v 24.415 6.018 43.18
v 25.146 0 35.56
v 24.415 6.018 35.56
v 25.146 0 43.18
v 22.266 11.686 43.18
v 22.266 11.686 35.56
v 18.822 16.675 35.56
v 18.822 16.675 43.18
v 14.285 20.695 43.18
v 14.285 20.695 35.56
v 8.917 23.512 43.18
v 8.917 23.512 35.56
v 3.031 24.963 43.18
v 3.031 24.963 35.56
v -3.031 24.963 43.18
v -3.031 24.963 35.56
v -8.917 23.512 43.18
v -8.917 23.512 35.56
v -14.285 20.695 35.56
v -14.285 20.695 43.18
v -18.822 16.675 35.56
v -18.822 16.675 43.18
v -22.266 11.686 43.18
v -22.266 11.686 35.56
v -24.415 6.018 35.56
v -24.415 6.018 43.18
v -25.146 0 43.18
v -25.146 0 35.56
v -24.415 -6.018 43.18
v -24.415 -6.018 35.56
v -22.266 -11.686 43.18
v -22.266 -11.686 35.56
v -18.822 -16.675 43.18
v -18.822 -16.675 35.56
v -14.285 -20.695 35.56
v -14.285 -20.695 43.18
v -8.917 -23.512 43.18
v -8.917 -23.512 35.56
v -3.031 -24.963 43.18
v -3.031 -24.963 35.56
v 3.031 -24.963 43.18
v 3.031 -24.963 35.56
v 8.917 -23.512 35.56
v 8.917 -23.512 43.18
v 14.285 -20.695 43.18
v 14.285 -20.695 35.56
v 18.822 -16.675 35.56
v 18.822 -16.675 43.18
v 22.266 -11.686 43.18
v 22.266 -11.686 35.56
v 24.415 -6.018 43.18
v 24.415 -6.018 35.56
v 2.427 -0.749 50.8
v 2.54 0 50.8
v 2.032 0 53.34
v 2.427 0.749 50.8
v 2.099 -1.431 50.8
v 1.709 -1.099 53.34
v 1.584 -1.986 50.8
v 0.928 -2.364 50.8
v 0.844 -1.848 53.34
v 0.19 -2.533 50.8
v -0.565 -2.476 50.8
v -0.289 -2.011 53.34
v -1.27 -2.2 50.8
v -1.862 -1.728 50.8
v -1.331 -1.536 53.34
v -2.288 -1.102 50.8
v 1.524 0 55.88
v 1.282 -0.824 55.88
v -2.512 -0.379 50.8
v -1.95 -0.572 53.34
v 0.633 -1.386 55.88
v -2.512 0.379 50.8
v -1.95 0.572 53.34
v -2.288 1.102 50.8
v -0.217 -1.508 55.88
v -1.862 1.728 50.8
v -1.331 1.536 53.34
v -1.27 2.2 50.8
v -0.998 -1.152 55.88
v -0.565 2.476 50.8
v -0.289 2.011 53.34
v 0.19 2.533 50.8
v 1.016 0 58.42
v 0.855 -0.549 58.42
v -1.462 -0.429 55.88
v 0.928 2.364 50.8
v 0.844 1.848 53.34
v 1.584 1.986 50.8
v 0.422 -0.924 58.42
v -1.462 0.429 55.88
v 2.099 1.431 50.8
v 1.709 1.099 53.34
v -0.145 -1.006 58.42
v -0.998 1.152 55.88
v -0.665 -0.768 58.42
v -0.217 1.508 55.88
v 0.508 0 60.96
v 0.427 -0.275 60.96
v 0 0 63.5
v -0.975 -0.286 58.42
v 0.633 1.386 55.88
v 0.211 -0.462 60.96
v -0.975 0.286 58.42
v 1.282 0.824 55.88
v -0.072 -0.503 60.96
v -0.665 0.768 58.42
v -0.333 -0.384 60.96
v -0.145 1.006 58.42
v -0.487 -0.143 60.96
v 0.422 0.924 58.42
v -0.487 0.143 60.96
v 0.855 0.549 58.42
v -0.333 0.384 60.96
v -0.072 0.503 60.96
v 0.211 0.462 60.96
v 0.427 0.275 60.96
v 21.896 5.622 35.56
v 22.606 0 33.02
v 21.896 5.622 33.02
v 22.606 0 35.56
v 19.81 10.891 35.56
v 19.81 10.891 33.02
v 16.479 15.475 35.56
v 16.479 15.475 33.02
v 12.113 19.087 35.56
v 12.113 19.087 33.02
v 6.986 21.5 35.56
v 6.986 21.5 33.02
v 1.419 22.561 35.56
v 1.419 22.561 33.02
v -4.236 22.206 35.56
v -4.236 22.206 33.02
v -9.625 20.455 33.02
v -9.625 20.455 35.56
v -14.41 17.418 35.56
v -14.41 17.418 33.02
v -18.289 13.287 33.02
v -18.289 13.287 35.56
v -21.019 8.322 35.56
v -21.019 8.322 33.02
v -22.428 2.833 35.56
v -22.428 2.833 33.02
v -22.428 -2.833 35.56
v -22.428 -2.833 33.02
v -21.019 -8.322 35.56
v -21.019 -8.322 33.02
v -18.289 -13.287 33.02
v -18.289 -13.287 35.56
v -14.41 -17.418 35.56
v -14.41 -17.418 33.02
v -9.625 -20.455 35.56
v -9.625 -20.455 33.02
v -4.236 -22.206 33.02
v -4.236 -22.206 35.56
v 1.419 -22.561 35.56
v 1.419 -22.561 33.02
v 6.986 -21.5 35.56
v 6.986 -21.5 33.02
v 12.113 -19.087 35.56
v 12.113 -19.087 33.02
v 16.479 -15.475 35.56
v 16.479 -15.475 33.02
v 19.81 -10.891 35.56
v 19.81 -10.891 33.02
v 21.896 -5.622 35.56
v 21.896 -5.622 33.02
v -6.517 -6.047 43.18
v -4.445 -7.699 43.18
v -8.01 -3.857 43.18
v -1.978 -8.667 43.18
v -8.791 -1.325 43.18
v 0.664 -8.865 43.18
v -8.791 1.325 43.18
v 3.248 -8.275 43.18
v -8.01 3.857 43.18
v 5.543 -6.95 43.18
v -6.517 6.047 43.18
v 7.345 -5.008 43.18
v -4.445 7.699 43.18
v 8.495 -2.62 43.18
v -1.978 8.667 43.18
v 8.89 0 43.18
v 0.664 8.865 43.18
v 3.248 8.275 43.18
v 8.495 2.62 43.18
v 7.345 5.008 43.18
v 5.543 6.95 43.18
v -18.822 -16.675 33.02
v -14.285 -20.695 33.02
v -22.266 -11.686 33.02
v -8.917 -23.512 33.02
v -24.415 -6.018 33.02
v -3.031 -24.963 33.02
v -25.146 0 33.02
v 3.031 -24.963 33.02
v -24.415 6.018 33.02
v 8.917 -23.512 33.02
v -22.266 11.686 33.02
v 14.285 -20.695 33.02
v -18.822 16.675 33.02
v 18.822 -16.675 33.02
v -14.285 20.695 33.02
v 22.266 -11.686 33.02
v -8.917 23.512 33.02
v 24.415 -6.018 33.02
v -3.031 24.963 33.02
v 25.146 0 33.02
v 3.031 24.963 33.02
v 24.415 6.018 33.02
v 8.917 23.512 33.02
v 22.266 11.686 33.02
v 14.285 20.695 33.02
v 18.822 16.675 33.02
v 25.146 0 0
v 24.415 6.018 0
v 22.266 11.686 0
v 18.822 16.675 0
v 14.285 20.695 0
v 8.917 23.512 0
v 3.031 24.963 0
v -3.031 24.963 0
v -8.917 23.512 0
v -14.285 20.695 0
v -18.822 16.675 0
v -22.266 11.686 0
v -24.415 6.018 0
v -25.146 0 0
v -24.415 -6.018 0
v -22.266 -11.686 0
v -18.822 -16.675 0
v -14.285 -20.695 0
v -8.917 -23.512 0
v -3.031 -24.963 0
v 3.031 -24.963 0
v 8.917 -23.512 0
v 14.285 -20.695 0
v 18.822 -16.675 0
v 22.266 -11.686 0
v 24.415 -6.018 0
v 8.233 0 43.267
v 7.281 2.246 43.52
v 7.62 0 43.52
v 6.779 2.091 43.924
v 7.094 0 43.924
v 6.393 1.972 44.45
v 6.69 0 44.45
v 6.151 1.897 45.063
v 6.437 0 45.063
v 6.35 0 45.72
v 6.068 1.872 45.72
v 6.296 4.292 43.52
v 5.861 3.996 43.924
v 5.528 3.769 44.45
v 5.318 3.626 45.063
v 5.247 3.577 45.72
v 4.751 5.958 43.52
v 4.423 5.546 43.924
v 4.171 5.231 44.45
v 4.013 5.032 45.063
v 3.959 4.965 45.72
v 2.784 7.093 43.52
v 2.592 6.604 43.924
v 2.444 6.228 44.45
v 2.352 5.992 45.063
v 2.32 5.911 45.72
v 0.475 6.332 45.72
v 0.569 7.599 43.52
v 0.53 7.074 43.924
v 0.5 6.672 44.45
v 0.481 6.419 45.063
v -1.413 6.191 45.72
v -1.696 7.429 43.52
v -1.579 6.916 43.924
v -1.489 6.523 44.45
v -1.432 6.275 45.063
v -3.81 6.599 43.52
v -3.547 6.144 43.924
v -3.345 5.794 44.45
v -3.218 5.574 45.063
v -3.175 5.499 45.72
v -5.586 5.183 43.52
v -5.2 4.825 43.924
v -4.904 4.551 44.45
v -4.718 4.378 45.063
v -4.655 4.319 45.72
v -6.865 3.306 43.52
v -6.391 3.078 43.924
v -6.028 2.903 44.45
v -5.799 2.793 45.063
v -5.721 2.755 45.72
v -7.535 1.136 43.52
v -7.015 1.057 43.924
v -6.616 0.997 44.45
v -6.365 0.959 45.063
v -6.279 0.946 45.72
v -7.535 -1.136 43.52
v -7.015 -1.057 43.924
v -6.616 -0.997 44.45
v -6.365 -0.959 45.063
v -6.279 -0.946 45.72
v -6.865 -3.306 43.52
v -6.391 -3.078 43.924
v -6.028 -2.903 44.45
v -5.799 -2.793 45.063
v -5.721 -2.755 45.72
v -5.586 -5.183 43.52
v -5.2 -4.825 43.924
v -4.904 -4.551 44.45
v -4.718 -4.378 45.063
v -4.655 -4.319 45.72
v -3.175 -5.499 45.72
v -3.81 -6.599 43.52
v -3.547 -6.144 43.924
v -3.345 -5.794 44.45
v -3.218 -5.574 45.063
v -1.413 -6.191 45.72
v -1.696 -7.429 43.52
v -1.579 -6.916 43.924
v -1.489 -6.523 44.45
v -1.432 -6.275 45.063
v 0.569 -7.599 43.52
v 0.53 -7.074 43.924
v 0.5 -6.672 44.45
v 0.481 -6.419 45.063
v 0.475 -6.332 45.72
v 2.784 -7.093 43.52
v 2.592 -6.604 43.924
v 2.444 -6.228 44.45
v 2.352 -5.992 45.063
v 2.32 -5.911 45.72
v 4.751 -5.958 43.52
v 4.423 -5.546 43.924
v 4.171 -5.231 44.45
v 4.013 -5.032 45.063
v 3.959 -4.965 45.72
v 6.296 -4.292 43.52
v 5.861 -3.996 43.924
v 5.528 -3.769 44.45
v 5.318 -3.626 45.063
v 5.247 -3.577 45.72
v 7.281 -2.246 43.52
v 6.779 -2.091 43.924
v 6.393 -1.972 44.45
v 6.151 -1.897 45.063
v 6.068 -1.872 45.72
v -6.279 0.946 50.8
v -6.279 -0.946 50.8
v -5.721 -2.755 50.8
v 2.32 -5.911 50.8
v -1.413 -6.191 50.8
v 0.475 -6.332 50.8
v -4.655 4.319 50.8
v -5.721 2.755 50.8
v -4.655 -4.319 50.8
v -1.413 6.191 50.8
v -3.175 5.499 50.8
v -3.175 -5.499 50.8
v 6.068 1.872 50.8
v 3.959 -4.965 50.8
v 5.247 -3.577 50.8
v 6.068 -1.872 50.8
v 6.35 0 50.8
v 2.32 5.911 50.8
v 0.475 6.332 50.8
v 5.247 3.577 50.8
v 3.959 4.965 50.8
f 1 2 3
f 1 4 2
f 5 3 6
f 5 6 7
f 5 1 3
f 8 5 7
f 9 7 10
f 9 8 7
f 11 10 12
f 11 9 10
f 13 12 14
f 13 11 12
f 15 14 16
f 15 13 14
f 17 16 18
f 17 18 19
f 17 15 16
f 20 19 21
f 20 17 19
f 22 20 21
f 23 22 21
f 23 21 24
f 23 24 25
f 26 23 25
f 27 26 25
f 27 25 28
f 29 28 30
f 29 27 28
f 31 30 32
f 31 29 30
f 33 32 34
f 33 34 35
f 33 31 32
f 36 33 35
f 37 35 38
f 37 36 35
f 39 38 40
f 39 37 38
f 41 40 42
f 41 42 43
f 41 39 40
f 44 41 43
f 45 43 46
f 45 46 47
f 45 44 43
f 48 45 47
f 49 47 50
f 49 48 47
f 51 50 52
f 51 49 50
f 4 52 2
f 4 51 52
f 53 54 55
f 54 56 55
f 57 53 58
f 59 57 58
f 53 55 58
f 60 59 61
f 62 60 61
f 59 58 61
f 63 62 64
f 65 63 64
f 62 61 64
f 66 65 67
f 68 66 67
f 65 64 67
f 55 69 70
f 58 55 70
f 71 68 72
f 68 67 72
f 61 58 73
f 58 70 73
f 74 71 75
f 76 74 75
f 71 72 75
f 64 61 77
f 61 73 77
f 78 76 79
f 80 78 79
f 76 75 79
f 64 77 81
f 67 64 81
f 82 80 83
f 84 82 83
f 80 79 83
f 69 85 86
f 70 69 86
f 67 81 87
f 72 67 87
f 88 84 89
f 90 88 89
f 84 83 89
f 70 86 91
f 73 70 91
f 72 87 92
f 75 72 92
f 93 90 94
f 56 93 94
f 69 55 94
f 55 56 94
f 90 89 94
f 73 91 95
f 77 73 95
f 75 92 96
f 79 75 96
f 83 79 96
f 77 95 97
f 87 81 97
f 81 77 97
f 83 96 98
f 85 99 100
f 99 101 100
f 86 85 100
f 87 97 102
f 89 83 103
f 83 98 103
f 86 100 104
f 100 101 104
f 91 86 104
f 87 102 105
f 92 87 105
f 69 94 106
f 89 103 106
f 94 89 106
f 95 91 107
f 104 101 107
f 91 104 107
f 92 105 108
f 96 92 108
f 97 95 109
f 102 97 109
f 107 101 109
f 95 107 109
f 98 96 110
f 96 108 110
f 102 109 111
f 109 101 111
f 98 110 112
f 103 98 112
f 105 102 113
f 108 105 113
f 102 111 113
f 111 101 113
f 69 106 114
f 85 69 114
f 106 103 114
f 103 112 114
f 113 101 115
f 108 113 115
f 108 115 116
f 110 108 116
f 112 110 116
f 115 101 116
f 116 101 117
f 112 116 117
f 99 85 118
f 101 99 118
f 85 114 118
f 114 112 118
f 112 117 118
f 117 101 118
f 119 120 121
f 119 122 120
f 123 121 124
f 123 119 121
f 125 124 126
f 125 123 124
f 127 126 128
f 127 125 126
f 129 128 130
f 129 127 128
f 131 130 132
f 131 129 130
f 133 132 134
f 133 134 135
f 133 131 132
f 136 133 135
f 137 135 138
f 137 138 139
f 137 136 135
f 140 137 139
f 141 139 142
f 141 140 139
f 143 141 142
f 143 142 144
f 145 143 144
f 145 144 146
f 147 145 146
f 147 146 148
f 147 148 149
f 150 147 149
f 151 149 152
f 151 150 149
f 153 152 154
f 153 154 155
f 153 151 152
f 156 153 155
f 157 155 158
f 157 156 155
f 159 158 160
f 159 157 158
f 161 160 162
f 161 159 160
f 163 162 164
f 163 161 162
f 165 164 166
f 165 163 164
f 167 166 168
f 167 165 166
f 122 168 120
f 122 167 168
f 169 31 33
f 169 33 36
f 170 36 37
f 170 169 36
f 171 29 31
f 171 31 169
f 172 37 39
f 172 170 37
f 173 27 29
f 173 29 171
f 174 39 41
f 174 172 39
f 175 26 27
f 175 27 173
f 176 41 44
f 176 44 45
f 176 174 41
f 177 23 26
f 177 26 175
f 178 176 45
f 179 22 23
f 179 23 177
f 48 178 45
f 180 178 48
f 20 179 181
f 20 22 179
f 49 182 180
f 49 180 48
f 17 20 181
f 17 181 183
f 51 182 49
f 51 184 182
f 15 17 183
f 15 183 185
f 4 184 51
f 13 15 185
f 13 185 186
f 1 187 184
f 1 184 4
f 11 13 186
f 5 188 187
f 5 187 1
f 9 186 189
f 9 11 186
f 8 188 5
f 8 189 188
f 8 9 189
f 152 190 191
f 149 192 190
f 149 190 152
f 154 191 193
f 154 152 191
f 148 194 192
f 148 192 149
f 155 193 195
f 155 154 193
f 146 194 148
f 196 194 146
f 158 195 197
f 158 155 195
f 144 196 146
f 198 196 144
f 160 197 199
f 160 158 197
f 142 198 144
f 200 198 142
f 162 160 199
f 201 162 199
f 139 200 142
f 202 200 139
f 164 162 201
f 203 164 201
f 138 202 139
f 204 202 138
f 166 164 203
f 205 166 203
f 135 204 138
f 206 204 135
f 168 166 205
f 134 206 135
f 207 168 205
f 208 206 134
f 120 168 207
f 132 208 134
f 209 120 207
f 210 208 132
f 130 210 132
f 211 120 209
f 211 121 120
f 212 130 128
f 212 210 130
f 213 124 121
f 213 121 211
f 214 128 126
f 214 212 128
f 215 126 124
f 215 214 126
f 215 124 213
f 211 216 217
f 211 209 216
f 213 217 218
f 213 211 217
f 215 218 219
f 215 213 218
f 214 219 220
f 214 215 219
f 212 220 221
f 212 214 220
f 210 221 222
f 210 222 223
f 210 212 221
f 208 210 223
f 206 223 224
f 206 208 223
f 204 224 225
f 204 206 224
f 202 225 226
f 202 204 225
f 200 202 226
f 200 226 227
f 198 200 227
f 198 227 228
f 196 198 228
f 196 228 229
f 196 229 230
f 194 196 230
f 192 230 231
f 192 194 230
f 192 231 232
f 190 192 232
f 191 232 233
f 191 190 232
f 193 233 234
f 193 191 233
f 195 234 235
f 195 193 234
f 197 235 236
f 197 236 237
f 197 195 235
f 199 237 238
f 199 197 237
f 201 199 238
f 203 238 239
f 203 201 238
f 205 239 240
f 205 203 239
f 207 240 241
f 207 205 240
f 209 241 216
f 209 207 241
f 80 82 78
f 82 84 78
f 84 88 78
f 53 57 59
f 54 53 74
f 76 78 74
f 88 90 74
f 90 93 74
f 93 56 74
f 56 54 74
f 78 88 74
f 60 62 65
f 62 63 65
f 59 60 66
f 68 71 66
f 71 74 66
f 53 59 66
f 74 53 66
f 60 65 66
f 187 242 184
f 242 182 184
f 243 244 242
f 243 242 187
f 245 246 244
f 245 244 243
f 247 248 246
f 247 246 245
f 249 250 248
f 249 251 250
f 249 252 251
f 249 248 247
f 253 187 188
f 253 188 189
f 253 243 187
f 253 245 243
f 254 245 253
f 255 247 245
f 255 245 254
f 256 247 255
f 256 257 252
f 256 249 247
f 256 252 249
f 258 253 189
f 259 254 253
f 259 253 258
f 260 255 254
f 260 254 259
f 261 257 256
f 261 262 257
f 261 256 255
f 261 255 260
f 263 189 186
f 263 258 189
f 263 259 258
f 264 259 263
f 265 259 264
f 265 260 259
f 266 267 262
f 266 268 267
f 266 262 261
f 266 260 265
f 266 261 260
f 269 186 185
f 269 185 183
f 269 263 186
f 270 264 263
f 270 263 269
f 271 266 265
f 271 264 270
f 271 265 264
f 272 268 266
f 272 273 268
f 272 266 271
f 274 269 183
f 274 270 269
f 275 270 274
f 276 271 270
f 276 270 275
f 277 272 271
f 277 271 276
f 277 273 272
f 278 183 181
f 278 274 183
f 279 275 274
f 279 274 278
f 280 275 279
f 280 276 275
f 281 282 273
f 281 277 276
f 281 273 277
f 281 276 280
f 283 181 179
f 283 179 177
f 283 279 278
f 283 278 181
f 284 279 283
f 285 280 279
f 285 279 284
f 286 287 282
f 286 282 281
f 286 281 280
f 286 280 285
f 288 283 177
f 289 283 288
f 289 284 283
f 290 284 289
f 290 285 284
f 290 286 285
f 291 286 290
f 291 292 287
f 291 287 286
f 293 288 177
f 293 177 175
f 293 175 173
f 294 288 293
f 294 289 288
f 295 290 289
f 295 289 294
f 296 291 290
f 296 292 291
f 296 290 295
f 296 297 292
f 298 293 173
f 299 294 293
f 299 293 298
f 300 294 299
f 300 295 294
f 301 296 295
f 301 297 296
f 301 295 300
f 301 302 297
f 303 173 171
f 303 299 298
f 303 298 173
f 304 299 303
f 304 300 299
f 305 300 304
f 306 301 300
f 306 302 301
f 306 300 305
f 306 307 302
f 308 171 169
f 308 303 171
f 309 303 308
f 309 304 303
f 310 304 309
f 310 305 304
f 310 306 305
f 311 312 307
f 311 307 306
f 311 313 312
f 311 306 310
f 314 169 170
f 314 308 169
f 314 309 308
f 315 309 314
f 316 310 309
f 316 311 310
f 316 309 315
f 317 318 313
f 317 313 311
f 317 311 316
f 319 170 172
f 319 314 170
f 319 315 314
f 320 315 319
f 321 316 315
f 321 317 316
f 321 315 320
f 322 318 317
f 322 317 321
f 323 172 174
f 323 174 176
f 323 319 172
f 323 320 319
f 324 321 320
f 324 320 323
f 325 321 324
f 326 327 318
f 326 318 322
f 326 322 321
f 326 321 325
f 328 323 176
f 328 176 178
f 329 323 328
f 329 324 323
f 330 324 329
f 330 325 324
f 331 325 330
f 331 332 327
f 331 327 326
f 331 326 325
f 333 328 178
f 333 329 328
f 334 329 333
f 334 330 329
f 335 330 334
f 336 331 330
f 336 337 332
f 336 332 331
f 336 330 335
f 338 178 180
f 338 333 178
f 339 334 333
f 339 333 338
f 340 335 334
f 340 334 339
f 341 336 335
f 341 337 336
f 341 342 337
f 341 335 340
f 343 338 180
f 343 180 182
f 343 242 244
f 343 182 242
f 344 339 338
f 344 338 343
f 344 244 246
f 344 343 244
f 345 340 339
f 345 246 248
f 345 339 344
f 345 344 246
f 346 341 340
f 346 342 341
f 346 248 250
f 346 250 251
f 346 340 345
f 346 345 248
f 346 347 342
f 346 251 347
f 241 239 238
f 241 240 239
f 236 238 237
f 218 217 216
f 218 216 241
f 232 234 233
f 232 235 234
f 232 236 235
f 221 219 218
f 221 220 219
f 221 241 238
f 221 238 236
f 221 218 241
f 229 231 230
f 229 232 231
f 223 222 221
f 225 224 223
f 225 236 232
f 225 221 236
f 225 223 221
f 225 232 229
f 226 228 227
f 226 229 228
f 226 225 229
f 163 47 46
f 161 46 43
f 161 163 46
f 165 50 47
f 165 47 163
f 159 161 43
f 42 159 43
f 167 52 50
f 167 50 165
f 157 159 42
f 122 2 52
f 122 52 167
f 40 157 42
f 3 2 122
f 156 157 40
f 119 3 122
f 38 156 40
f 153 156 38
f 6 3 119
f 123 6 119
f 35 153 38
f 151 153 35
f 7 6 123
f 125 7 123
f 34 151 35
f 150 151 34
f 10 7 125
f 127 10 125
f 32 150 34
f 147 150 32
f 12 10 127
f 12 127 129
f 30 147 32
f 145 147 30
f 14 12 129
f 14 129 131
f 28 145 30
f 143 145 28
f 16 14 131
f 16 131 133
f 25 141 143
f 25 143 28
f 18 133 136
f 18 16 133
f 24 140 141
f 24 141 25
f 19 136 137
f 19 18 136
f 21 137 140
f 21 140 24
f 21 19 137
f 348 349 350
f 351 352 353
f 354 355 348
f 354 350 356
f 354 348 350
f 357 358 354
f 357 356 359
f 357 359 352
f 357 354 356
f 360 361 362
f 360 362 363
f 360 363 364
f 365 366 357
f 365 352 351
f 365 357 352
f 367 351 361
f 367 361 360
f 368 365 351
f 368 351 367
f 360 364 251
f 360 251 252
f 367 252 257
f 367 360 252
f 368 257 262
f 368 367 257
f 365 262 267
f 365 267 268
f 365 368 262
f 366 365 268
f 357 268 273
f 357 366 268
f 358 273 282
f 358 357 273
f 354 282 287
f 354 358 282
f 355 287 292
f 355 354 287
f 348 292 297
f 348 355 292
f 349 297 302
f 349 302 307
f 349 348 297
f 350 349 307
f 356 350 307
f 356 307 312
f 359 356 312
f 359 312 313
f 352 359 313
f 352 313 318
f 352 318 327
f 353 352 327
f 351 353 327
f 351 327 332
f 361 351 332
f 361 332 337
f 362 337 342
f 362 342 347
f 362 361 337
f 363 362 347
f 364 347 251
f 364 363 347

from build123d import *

# Parameters (mm, degrees)
F3_R = 2.54


with BuildPart() as f2:
    # F0 (on Front) → F2 (revolve)
    with BuildSketch(Plane.XZ):
        Polygon((0, 43.18), (0, 0), (25.146, 0), (25.146, 33.02), (22.606, 33.02), (22.606, 35.56), (25.146, 35.56), (25.146, 43.18), (6.35, 43.18), (6.35, 50.8), (3.175, 50.8), (0, 50.8), align=None)
    revolve(axis=Axis((0, 0, 20.32), (0, 0, 1)))

    # F3
    f3_edges = [f2.edges().sort_by_distance(p)[0] for p in [
        (-6.35, 0, 43.18),
    ]]
    fillet(f3_edges, radius=F3_R)


with BuildPart() as f6:
    # F4 (on Front) → F6 (revolve)
    with BuildSketch(Plane.XZ):
        Polygon((0, 50.8), (2.54, 50.8), (0, 63.5), align=None)
    revolve(axis=Axis((0, 0, 57.15), (0, 0, -1)))


solid = Compound([f2.part, f6.part])
